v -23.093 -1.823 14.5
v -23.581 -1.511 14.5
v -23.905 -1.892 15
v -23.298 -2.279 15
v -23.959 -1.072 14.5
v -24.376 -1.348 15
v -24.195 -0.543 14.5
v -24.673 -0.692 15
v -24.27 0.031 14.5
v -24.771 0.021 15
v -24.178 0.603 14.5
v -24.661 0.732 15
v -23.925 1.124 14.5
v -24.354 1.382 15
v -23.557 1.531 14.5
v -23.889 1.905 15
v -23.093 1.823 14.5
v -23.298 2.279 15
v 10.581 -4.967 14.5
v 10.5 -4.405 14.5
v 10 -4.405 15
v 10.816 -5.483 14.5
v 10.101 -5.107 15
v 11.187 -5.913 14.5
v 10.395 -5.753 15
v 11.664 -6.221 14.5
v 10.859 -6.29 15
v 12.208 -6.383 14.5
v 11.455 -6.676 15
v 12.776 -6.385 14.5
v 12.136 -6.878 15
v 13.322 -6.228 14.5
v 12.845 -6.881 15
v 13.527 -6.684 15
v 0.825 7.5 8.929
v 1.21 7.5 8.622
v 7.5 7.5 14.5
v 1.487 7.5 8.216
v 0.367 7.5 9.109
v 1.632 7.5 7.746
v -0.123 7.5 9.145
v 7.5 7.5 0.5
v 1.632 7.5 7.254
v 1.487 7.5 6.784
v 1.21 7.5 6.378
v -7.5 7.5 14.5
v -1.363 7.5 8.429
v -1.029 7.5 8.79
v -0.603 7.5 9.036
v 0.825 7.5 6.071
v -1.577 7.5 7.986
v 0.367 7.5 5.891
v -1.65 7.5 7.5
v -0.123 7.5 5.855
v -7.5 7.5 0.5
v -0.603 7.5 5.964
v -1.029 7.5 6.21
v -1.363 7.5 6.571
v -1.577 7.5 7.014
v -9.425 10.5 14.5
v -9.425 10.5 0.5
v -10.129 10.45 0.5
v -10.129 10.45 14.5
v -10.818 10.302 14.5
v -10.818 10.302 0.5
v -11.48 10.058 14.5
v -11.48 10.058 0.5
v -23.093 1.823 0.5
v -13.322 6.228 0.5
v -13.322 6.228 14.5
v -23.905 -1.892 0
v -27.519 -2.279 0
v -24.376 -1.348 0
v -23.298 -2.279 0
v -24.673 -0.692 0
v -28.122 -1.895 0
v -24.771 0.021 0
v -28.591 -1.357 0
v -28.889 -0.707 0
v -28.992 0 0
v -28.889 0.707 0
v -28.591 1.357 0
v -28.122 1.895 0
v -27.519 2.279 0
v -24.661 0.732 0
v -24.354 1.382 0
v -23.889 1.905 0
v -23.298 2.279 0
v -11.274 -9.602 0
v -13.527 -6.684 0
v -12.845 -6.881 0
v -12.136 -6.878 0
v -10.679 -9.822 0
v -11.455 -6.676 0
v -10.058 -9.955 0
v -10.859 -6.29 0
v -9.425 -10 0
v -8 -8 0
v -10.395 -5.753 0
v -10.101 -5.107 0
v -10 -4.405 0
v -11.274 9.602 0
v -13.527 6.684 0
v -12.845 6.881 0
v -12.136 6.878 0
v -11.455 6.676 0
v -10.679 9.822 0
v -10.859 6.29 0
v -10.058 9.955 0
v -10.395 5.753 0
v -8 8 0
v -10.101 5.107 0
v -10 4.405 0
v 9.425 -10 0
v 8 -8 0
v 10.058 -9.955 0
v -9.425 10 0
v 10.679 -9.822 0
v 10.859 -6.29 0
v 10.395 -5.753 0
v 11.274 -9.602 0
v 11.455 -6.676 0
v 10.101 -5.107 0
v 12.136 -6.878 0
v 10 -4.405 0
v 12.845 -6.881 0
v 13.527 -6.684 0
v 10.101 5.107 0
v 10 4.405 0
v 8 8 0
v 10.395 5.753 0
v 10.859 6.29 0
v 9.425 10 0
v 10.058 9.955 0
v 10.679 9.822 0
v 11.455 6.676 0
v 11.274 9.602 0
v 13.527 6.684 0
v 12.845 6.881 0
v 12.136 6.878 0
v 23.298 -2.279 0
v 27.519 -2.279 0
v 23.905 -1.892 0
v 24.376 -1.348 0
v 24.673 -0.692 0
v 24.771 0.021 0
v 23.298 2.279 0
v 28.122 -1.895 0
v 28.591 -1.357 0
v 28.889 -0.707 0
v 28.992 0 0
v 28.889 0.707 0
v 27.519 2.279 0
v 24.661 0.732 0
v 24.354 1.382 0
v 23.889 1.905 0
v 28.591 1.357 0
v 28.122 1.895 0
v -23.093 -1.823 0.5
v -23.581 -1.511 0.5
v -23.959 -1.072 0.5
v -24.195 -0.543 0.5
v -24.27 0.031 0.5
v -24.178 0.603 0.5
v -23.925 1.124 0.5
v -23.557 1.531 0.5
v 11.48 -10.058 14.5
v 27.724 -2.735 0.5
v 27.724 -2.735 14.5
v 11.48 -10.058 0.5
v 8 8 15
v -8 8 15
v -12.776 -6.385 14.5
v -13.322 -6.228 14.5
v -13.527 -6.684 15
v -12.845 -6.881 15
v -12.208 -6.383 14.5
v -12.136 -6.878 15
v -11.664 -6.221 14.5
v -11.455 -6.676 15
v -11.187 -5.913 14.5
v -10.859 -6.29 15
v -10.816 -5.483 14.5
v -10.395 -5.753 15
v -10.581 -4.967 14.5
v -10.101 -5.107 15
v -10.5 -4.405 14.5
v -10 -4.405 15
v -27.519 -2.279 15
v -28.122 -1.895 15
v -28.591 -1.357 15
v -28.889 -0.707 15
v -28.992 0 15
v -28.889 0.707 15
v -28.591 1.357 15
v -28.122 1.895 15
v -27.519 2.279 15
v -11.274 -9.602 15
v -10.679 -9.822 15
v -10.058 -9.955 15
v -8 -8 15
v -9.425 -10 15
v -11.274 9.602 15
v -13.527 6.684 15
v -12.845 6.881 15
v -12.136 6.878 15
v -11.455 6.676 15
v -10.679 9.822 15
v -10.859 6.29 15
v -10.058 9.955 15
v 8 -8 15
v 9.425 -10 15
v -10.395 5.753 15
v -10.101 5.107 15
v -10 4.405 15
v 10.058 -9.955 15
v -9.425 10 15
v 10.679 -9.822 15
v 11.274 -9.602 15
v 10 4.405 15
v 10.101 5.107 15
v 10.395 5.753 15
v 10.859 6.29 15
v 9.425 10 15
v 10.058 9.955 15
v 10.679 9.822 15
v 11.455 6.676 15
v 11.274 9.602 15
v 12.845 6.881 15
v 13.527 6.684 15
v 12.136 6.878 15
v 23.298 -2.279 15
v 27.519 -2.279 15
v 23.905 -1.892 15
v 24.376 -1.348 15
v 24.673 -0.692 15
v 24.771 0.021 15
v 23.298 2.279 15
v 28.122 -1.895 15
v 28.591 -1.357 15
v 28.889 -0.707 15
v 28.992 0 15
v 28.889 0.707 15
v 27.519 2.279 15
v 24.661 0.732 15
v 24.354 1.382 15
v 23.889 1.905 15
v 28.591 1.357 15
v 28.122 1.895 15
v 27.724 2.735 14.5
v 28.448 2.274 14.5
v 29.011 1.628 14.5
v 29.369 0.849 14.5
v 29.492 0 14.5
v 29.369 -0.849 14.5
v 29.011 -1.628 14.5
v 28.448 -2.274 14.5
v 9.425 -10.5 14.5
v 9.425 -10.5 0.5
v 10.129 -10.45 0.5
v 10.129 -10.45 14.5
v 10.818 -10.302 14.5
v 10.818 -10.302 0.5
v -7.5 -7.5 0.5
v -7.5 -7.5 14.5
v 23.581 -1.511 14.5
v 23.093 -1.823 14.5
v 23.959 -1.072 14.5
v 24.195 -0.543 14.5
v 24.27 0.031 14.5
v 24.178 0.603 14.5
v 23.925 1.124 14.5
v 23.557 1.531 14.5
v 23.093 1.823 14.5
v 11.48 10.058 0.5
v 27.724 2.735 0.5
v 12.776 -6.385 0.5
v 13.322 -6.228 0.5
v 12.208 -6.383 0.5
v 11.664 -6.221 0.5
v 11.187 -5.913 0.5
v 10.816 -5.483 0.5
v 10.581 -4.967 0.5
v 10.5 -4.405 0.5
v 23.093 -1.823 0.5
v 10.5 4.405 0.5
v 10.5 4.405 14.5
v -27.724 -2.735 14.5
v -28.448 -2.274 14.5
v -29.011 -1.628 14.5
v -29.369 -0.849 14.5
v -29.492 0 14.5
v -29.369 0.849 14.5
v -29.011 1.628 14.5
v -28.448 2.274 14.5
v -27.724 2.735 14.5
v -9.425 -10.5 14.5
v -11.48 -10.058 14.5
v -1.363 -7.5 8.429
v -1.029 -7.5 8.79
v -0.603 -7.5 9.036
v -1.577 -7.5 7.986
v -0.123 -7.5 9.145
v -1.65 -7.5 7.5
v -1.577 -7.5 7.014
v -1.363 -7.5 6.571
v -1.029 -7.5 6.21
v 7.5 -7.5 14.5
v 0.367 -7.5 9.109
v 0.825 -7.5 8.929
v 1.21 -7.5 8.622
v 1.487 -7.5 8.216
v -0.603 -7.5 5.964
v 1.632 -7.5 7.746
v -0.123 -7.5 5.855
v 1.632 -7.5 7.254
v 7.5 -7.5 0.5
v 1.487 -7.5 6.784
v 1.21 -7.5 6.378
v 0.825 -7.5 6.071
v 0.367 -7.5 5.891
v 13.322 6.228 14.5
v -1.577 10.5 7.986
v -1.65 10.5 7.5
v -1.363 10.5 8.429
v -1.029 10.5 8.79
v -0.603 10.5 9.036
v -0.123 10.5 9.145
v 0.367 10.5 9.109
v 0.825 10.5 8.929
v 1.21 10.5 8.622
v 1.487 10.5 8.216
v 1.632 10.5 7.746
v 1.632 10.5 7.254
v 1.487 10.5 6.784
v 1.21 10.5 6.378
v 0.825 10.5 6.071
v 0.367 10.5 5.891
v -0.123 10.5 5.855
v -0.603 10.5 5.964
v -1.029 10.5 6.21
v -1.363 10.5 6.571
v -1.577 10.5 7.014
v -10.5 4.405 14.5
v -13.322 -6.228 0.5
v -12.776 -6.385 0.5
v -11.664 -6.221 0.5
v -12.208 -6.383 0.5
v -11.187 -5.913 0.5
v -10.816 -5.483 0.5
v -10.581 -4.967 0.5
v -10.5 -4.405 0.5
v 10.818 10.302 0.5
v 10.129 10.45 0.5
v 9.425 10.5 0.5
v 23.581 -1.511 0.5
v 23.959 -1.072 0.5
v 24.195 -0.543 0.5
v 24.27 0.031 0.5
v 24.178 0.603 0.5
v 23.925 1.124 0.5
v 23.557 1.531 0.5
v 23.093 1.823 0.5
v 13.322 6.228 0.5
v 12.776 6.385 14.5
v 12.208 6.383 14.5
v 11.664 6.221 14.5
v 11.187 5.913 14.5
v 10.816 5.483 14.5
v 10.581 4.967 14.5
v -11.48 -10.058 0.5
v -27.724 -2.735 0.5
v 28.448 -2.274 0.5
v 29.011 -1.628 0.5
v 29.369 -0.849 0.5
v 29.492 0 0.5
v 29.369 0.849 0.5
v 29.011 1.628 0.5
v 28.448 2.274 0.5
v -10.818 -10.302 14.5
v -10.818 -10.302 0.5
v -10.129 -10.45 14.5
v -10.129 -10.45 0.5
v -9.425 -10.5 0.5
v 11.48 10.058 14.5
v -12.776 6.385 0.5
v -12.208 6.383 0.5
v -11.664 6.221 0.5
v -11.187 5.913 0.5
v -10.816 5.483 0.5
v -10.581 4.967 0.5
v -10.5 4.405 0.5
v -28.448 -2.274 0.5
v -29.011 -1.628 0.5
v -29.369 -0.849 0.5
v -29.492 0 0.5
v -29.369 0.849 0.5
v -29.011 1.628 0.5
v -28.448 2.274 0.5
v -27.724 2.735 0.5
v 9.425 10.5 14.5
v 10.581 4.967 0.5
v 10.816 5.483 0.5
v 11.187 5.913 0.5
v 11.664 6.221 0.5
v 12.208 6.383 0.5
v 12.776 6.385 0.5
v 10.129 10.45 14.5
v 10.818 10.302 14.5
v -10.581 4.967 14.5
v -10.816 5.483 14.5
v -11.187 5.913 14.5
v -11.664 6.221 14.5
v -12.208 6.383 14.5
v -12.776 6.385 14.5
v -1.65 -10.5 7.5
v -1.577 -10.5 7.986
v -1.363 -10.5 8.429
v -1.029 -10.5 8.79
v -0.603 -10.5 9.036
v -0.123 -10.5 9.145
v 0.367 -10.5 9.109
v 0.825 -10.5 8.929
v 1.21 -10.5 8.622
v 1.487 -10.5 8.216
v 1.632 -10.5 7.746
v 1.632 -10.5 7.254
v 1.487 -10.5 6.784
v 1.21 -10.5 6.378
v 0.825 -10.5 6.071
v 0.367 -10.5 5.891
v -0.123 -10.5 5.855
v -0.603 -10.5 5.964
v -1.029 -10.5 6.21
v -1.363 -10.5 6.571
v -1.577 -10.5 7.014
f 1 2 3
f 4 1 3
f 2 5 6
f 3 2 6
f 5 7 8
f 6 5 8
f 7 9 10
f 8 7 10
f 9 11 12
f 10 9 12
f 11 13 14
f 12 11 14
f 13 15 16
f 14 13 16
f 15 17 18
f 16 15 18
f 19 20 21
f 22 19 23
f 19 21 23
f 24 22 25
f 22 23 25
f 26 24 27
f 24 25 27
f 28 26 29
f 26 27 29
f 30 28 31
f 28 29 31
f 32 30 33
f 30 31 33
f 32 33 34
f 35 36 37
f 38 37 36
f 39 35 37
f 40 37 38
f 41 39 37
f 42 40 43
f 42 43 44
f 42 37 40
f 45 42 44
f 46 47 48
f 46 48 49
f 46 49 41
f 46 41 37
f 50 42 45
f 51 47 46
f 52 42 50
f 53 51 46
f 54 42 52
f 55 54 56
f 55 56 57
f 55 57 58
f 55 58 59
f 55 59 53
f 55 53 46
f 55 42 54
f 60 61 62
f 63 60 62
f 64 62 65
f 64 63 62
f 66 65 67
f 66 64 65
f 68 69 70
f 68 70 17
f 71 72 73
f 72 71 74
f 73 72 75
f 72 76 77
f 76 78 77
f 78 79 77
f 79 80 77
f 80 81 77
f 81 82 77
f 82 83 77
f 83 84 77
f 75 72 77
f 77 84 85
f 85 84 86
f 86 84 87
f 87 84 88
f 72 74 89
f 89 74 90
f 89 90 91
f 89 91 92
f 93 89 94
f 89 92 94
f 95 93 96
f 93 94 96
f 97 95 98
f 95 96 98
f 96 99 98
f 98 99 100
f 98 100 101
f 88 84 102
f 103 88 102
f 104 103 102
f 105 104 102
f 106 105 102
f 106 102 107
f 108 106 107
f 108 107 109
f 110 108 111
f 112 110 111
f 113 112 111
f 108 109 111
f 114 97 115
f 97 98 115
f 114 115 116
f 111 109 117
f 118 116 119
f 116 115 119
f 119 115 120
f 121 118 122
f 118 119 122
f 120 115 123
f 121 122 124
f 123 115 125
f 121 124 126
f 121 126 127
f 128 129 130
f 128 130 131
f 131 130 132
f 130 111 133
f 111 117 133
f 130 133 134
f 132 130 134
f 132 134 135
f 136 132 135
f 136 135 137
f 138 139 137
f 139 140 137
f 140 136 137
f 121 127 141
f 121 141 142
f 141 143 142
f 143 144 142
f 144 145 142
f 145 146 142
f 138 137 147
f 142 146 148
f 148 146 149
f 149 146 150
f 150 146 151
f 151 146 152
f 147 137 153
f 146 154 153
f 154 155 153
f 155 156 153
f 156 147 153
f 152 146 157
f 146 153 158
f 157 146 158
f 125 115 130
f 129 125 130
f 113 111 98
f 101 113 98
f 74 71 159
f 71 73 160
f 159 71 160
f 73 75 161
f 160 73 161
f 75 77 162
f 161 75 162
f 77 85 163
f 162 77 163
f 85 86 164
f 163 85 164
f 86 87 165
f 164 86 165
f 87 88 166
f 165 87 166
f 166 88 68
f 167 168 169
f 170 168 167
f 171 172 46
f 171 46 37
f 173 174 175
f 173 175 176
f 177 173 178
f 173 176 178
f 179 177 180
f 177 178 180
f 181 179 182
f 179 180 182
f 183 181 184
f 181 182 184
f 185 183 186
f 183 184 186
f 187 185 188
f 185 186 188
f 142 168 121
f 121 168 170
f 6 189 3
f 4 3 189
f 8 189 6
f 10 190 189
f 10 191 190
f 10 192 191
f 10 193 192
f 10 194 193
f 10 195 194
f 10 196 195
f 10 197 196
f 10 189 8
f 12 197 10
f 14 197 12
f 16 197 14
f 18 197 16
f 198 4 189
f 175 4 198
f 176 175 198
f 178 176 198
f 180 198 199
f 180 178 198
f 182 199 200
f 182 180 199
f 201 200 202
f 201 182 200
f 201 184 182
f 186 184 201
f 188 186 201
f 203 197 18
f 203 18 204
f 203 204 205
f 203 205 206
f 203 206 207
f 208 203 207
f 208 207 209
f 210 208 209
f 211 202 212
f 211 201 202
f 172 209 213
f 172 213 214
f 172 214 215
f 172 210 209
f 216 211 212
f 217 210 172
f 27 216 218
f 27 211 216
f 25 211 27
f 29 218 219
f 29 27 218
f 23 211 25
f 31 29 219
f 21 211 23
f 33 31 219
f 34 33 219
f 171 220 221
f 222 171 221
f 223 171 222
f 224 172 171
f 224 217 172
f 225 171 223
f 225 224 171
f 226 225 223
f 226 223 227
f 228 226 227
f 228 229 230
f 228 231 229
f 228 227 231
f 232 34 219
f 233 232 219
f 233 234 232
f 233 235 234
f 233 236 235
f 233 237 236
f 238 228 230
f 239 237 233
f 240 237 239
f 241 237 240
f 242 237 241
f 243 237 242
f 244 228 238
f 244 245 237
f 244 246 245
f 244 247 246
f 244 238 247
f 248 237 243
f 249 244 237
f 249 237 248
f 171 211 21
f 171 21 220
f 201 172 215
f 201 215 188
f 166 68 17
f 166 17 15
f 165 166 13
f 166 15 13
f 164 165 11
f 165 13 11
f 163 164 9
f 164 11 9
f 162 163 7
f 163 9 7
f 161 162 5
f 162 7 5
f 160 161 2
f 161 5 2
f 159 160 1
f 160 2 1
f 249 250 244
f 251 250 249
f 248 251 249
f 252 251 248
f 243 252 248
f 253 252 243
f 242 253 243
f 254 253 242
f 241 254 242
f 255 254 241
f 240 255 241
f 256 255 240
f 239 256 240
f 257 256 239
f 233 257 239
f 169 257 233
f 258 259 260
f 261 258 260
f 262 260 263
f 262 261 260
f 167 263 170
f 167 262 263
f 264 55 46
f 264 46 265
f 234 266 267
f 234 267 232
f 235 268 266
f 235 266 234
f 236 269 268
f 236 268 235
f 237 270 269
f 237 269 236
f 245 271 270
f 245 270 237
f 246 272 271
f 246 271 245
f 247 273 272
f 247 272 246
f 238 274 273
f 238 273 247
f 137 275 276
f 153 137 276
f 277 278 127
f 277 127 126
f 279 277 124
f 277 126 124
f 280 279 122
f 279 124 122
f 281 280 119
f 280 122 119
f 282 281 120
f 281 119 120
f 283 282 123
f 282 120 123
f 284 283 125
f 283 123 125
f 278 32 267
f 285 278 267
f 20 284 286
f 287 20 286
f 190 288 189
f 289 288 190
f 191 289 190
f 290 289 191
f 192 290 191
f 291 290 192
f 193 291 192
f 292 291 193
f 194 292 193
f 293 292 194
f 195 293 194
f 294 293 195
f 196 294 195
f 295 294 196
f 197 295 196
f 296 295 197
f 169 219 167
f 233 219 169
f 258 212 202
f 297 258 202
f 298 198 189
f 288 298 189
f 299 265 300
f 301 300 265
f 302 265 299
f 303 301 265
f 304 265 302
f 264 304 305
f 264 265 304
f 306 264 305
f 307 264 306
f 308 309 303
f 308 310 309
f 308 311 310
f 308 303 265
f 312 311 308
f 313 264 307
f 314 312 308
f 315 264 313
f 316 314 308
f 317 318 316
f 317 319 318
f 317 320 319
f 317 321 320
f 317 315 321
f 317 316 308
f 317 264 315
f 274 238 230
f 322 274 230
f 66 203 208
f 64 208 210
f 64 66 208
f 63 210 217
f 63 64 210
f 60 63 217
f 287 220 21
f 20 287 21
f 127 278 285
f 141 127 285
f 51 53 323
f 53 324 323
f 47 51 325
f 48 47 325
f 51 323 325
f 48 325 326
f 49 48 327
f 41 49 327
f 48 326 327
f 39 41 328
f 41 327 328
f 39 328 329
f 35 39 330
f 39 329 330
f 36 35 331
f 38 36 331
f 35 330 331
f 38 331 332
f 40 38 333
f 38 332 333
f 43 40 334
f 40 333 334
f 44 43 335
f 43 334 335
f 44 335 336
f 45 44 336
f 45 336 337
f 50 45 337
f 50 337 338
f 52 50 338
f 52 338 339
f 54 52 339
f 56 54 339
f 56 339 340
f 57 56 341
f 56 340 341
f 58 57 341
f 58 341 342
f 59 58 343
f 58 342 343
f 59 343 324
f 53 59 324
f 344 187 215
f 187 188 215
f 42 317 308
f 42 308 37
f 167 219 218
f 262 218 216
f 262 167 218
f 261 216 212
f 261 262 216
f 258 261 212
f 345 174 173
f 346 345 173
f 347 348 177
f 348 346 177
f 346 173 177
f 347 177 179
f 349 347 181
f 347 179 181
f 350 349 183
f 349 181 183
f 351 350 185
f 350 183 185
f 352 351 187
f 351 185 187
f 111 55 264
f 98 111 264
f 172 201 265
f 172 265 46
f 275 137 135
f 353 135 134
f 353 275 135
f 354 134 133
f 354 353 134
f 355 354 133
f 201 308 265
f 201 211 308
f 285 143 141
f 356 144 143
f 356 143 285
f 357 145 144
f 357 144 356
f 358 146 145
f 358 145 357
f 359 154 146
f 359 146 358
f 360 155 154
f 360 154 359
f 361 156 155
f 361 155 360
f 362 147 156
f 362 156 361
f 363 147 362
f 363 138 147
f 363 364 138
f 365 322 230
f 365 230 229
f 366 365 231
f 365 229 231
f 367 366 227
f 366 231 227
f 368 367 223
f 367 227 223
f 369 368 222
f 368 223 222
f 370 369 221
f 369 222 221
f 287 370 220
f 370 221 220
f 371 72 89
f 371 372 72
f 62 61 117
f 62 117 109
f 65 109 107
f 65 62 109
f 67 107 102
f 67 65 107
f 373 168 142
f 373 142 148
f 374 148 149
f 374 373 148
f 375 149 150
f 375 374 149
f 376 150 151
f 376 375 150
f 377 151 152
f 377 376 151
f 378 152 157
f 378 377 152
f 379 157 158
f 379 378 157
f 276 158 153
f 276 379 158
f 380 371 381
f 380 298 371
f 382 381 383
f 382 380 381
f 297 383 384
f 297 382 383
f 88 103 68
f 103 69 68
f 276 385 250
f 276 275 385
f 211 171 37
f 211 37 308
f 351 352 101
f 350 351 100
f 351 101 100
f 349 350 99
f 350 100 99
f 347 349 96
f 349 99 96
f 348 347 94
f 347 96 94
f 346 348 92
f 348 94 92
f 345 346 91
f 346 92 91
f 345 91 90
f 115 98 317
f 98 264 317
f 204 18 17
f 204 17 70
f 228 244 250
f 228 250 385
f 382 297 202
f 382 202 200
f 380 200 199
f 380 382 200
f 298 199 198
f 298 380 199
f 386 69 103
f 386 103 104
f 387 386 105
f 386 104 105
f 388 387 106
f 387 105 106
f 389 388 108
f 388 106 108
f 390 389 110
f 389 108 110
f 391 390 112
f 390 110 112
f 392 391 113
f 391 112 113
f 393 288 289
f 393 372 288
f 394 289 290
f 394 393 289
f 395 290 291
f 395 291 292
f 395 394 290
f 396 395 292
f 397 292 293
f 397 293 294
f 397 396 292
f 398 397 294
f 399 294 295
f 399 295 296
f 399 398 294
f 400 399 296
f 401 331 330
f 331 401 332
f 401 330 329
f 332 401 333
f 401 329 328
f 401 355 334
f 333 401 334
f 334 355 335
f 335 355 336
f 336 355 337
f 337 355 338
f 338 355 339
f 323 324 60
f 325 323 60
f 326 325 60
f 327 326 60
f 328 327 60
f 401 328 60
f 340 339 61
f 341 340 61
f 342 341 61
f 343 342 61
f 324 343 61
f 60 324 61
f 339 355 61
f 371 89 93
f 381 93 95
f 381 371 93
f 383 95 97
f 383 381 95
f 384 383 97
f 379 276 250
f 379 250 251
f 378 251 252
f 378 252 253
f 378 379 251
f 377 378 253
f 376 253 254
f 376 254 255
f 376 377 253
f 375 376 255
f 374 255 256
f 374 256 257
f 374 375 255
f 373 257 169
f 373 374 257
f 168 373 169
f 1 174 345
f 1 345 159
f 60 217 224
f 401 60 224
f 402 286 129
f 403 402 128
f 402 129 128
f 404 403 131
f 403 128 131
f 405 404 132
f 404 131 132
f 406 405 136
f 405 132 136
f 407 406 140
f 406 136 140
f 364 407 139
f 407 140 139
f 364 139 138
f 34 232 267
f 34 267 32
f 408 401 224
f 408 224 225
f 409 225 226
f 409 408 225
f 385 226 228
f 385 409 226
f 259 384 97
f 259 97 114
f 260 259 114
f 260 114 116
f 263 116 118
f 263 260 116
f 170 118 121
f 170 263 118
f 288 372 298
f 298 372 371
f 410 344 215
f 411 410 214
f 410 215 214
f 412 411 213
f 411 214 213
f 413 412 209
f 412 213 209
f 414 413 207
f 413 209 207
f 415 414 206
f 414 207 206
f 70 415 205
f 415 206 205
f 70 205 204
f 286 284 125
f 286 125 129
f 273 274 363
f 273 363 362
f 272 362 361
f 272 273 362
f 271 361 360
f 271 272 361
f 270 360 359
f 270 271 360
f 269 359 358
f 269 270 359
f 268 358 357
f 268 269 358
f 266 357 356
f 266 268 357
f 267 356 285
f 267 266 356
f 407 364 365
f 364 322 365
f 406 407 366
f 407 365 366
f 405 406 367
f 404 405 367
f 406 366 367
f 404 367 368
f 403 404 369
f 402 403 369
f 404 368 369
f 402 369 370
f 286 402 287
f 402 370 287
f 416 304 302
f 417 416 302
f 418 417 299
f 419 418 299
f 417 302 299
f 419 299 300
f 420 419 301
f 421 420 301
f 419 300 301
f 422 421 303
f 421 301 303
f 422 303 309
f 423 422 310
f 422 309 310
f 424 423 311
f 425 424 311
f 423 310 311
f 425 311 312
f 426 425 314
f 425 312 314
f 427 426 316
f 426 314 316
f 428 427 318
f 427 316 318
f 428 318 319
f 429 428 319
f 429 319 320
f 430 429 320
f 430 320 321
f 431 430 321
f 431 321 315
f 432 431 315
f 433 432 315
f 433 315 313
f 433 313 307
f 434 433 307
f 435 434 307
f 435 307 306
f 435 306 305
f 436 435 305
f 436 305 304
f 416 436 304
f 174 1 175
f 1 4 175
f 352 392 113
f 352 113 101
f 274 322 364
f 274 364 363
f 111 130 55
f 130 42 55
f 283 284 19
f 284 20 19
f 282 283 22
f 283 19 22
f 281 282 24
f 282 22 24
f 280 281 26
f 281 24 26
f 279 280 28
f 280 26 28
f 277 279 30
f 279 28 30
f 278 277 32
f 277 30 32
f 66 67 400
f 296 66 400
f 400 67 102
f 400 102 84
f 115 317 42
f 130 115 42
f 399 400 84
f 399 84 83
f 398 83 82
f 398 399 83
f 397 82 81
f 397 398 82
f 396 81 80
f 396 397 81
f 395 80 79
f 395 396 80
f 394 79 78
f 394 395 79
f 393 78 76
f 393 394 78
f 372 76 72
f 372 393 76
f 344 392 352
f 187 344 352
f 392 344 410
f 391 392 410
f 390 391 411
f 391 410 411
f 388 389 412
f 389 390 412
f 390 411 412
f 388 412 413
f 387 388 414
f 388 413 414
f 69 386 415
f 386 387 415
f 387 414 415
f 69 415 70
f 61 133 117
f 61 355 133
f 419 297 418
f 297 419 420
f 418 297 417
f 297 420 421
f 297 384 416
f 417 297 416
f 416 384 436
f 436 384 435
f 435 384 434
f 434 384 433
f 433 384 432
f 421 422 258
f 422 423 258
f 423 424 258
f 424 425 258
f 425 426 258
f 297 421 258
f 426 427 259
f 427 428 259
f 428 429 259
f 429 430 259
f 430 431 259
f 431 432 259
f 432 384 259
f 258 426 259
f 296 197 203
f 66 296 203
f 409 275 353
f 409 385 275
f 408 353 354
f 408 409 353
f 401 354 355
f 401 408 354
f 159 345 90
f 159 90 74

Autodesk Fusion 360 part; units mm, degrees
sketch "Sketch1" plane through (0, 0, 0) normal (0, 0, 1) x (1, 0, 0)
  line L0 (10.5, 10.5) -> (-10.5, 10.5)
  line L1 (-10.5, 10.5) -> (-10.5, -10.5)
  line L2 (-10.5, -10.5) -> (10.5, -10.5)
  line L3 (10.5, -10.5) -> (10.5, 10.5)
  line L4 (10.5, 10.5) -> (-10.5, -10.5) construction
  line L5 (-10.5, 10.5) -> (10.5, -10.5) construction
  line L6 (7.5, 7.5) -> (-7.5, 7.5)
  line L7 (-7.5, 7.5) -> (-7.5, -7.5)
  line L8 (-7.5, -7.5) -> (7.5, -7.5)
  line L9 (7.5, -7.5) -> (7.5, 7.5)
  line L10 (7.5, 7.5) -> (-7.5, -7.5) construction
  line L11 (-7.5, 7.5) -> (7.5, -7.5) construction
  line L12 (10.5, 10.5) -> (27.7245, 2.7349)
  line L13 (27.7245, -2.7349) -> (10.5, -10.5)
  line L14 (-10.5, 10.5) -> (-27.7245, 2.7349)
  line L15 (-27.7245, -2.7349) -> (-10.5, -10.5)
  arc A0 (27.7245, -2.7349) -> (27.7245, 2.7349) centre (26.4916, 0) ccw
  arc A1 (-27.7245, 2.7349) -> (-27.7245, -2.7349) centre (-26.4916, 0) ccw
  line L16 (26.4916, 0) -> (0, 0) construction
  line L17 (0, 0) -> (-26.4916, 0) construction
  line L18 (7.5, 7.5) -> (10.5, 7.5) construction
  line L19 (7.5, -7.5) -> (10.5, -7.5) construction
  line L20 (-7.5, -7.5) -> (-10.5, -7.5) construction
  line L21 (-7.5, 7.5) -> (-10.5, 7.5) construction
  line L22 (10.5, 7.5) -> (27.1365, 0)
  line L23 (10.5, -7.5) -> (27.1365, 0)
  line L24 (-10.5, 7.5) -> (-27.1365, 0)
  line L25 (-10.5, -7.5) -> (-27.1365, 0)
  line L26 (-24.3008, 1.2784) -> (-24.3008, -1.2784)
  line L27 (24.3008, -1.2784) -> (24.3008, 1.2784)
  dimension "d1" = 15
  dimension "d2" = 3
  dimension "d3" = 3
  dimension "d4" = 3
extrude "Extrude1" add sketch "Sketch1" along normal blind 15 contours L0 L1 L2 L3 | L3 L12 L13 A0 L22 L23 | L1 L14 L15 A1 L24 L25 | L22 L23 L27 | L24 L25 L26
fillet "Fillet1" radius 5 4 edges at (-10.5, -10.5, 7.5) (10.5, -10.5, 7.5) (10.5, 10.5, 7.5) (-10.5, 10.5, 7.5)
fillet "Fillet2" radius 2 8 edges at (-10.5, 7.5, 7.5) (-10.5, -7.5, 7.5) (-24.3008, -1.2784, 7.5) (-24.3008, 1.2784, 7.5) (10.5, 7.5, 7.5) (10.5, -7.5, 7.5) (24.3008, -1.2784, 7.5) (24.3008, 1.2784, 7.5)
sketch "Sketch2" plane through (0, 10.5, 0) normal (0, 1, 0) x (-1, 0, 0)
  line L0 (9.4251, 0) -> (9.4251, 15)
  line L1 (9.4251, 15) -> (-9.4251, 15)
  line L2 (-9.4251, 15) -> (-9.4251, 0)
  line L3 (-9.4251, 0) -> (9.4251, 0)
  circle A0 centre (0, 7.5) radius 1.65
  dimension "d13" = 3.3
extrude "Extrude2" cut sketch "Sketch2" against normal blind 35 contours A0
chamfer "Chamfer1" distance 0.5 angle 45 2 faces at (2.5, -9.5, 0) (2.5, -9.5, 15)
